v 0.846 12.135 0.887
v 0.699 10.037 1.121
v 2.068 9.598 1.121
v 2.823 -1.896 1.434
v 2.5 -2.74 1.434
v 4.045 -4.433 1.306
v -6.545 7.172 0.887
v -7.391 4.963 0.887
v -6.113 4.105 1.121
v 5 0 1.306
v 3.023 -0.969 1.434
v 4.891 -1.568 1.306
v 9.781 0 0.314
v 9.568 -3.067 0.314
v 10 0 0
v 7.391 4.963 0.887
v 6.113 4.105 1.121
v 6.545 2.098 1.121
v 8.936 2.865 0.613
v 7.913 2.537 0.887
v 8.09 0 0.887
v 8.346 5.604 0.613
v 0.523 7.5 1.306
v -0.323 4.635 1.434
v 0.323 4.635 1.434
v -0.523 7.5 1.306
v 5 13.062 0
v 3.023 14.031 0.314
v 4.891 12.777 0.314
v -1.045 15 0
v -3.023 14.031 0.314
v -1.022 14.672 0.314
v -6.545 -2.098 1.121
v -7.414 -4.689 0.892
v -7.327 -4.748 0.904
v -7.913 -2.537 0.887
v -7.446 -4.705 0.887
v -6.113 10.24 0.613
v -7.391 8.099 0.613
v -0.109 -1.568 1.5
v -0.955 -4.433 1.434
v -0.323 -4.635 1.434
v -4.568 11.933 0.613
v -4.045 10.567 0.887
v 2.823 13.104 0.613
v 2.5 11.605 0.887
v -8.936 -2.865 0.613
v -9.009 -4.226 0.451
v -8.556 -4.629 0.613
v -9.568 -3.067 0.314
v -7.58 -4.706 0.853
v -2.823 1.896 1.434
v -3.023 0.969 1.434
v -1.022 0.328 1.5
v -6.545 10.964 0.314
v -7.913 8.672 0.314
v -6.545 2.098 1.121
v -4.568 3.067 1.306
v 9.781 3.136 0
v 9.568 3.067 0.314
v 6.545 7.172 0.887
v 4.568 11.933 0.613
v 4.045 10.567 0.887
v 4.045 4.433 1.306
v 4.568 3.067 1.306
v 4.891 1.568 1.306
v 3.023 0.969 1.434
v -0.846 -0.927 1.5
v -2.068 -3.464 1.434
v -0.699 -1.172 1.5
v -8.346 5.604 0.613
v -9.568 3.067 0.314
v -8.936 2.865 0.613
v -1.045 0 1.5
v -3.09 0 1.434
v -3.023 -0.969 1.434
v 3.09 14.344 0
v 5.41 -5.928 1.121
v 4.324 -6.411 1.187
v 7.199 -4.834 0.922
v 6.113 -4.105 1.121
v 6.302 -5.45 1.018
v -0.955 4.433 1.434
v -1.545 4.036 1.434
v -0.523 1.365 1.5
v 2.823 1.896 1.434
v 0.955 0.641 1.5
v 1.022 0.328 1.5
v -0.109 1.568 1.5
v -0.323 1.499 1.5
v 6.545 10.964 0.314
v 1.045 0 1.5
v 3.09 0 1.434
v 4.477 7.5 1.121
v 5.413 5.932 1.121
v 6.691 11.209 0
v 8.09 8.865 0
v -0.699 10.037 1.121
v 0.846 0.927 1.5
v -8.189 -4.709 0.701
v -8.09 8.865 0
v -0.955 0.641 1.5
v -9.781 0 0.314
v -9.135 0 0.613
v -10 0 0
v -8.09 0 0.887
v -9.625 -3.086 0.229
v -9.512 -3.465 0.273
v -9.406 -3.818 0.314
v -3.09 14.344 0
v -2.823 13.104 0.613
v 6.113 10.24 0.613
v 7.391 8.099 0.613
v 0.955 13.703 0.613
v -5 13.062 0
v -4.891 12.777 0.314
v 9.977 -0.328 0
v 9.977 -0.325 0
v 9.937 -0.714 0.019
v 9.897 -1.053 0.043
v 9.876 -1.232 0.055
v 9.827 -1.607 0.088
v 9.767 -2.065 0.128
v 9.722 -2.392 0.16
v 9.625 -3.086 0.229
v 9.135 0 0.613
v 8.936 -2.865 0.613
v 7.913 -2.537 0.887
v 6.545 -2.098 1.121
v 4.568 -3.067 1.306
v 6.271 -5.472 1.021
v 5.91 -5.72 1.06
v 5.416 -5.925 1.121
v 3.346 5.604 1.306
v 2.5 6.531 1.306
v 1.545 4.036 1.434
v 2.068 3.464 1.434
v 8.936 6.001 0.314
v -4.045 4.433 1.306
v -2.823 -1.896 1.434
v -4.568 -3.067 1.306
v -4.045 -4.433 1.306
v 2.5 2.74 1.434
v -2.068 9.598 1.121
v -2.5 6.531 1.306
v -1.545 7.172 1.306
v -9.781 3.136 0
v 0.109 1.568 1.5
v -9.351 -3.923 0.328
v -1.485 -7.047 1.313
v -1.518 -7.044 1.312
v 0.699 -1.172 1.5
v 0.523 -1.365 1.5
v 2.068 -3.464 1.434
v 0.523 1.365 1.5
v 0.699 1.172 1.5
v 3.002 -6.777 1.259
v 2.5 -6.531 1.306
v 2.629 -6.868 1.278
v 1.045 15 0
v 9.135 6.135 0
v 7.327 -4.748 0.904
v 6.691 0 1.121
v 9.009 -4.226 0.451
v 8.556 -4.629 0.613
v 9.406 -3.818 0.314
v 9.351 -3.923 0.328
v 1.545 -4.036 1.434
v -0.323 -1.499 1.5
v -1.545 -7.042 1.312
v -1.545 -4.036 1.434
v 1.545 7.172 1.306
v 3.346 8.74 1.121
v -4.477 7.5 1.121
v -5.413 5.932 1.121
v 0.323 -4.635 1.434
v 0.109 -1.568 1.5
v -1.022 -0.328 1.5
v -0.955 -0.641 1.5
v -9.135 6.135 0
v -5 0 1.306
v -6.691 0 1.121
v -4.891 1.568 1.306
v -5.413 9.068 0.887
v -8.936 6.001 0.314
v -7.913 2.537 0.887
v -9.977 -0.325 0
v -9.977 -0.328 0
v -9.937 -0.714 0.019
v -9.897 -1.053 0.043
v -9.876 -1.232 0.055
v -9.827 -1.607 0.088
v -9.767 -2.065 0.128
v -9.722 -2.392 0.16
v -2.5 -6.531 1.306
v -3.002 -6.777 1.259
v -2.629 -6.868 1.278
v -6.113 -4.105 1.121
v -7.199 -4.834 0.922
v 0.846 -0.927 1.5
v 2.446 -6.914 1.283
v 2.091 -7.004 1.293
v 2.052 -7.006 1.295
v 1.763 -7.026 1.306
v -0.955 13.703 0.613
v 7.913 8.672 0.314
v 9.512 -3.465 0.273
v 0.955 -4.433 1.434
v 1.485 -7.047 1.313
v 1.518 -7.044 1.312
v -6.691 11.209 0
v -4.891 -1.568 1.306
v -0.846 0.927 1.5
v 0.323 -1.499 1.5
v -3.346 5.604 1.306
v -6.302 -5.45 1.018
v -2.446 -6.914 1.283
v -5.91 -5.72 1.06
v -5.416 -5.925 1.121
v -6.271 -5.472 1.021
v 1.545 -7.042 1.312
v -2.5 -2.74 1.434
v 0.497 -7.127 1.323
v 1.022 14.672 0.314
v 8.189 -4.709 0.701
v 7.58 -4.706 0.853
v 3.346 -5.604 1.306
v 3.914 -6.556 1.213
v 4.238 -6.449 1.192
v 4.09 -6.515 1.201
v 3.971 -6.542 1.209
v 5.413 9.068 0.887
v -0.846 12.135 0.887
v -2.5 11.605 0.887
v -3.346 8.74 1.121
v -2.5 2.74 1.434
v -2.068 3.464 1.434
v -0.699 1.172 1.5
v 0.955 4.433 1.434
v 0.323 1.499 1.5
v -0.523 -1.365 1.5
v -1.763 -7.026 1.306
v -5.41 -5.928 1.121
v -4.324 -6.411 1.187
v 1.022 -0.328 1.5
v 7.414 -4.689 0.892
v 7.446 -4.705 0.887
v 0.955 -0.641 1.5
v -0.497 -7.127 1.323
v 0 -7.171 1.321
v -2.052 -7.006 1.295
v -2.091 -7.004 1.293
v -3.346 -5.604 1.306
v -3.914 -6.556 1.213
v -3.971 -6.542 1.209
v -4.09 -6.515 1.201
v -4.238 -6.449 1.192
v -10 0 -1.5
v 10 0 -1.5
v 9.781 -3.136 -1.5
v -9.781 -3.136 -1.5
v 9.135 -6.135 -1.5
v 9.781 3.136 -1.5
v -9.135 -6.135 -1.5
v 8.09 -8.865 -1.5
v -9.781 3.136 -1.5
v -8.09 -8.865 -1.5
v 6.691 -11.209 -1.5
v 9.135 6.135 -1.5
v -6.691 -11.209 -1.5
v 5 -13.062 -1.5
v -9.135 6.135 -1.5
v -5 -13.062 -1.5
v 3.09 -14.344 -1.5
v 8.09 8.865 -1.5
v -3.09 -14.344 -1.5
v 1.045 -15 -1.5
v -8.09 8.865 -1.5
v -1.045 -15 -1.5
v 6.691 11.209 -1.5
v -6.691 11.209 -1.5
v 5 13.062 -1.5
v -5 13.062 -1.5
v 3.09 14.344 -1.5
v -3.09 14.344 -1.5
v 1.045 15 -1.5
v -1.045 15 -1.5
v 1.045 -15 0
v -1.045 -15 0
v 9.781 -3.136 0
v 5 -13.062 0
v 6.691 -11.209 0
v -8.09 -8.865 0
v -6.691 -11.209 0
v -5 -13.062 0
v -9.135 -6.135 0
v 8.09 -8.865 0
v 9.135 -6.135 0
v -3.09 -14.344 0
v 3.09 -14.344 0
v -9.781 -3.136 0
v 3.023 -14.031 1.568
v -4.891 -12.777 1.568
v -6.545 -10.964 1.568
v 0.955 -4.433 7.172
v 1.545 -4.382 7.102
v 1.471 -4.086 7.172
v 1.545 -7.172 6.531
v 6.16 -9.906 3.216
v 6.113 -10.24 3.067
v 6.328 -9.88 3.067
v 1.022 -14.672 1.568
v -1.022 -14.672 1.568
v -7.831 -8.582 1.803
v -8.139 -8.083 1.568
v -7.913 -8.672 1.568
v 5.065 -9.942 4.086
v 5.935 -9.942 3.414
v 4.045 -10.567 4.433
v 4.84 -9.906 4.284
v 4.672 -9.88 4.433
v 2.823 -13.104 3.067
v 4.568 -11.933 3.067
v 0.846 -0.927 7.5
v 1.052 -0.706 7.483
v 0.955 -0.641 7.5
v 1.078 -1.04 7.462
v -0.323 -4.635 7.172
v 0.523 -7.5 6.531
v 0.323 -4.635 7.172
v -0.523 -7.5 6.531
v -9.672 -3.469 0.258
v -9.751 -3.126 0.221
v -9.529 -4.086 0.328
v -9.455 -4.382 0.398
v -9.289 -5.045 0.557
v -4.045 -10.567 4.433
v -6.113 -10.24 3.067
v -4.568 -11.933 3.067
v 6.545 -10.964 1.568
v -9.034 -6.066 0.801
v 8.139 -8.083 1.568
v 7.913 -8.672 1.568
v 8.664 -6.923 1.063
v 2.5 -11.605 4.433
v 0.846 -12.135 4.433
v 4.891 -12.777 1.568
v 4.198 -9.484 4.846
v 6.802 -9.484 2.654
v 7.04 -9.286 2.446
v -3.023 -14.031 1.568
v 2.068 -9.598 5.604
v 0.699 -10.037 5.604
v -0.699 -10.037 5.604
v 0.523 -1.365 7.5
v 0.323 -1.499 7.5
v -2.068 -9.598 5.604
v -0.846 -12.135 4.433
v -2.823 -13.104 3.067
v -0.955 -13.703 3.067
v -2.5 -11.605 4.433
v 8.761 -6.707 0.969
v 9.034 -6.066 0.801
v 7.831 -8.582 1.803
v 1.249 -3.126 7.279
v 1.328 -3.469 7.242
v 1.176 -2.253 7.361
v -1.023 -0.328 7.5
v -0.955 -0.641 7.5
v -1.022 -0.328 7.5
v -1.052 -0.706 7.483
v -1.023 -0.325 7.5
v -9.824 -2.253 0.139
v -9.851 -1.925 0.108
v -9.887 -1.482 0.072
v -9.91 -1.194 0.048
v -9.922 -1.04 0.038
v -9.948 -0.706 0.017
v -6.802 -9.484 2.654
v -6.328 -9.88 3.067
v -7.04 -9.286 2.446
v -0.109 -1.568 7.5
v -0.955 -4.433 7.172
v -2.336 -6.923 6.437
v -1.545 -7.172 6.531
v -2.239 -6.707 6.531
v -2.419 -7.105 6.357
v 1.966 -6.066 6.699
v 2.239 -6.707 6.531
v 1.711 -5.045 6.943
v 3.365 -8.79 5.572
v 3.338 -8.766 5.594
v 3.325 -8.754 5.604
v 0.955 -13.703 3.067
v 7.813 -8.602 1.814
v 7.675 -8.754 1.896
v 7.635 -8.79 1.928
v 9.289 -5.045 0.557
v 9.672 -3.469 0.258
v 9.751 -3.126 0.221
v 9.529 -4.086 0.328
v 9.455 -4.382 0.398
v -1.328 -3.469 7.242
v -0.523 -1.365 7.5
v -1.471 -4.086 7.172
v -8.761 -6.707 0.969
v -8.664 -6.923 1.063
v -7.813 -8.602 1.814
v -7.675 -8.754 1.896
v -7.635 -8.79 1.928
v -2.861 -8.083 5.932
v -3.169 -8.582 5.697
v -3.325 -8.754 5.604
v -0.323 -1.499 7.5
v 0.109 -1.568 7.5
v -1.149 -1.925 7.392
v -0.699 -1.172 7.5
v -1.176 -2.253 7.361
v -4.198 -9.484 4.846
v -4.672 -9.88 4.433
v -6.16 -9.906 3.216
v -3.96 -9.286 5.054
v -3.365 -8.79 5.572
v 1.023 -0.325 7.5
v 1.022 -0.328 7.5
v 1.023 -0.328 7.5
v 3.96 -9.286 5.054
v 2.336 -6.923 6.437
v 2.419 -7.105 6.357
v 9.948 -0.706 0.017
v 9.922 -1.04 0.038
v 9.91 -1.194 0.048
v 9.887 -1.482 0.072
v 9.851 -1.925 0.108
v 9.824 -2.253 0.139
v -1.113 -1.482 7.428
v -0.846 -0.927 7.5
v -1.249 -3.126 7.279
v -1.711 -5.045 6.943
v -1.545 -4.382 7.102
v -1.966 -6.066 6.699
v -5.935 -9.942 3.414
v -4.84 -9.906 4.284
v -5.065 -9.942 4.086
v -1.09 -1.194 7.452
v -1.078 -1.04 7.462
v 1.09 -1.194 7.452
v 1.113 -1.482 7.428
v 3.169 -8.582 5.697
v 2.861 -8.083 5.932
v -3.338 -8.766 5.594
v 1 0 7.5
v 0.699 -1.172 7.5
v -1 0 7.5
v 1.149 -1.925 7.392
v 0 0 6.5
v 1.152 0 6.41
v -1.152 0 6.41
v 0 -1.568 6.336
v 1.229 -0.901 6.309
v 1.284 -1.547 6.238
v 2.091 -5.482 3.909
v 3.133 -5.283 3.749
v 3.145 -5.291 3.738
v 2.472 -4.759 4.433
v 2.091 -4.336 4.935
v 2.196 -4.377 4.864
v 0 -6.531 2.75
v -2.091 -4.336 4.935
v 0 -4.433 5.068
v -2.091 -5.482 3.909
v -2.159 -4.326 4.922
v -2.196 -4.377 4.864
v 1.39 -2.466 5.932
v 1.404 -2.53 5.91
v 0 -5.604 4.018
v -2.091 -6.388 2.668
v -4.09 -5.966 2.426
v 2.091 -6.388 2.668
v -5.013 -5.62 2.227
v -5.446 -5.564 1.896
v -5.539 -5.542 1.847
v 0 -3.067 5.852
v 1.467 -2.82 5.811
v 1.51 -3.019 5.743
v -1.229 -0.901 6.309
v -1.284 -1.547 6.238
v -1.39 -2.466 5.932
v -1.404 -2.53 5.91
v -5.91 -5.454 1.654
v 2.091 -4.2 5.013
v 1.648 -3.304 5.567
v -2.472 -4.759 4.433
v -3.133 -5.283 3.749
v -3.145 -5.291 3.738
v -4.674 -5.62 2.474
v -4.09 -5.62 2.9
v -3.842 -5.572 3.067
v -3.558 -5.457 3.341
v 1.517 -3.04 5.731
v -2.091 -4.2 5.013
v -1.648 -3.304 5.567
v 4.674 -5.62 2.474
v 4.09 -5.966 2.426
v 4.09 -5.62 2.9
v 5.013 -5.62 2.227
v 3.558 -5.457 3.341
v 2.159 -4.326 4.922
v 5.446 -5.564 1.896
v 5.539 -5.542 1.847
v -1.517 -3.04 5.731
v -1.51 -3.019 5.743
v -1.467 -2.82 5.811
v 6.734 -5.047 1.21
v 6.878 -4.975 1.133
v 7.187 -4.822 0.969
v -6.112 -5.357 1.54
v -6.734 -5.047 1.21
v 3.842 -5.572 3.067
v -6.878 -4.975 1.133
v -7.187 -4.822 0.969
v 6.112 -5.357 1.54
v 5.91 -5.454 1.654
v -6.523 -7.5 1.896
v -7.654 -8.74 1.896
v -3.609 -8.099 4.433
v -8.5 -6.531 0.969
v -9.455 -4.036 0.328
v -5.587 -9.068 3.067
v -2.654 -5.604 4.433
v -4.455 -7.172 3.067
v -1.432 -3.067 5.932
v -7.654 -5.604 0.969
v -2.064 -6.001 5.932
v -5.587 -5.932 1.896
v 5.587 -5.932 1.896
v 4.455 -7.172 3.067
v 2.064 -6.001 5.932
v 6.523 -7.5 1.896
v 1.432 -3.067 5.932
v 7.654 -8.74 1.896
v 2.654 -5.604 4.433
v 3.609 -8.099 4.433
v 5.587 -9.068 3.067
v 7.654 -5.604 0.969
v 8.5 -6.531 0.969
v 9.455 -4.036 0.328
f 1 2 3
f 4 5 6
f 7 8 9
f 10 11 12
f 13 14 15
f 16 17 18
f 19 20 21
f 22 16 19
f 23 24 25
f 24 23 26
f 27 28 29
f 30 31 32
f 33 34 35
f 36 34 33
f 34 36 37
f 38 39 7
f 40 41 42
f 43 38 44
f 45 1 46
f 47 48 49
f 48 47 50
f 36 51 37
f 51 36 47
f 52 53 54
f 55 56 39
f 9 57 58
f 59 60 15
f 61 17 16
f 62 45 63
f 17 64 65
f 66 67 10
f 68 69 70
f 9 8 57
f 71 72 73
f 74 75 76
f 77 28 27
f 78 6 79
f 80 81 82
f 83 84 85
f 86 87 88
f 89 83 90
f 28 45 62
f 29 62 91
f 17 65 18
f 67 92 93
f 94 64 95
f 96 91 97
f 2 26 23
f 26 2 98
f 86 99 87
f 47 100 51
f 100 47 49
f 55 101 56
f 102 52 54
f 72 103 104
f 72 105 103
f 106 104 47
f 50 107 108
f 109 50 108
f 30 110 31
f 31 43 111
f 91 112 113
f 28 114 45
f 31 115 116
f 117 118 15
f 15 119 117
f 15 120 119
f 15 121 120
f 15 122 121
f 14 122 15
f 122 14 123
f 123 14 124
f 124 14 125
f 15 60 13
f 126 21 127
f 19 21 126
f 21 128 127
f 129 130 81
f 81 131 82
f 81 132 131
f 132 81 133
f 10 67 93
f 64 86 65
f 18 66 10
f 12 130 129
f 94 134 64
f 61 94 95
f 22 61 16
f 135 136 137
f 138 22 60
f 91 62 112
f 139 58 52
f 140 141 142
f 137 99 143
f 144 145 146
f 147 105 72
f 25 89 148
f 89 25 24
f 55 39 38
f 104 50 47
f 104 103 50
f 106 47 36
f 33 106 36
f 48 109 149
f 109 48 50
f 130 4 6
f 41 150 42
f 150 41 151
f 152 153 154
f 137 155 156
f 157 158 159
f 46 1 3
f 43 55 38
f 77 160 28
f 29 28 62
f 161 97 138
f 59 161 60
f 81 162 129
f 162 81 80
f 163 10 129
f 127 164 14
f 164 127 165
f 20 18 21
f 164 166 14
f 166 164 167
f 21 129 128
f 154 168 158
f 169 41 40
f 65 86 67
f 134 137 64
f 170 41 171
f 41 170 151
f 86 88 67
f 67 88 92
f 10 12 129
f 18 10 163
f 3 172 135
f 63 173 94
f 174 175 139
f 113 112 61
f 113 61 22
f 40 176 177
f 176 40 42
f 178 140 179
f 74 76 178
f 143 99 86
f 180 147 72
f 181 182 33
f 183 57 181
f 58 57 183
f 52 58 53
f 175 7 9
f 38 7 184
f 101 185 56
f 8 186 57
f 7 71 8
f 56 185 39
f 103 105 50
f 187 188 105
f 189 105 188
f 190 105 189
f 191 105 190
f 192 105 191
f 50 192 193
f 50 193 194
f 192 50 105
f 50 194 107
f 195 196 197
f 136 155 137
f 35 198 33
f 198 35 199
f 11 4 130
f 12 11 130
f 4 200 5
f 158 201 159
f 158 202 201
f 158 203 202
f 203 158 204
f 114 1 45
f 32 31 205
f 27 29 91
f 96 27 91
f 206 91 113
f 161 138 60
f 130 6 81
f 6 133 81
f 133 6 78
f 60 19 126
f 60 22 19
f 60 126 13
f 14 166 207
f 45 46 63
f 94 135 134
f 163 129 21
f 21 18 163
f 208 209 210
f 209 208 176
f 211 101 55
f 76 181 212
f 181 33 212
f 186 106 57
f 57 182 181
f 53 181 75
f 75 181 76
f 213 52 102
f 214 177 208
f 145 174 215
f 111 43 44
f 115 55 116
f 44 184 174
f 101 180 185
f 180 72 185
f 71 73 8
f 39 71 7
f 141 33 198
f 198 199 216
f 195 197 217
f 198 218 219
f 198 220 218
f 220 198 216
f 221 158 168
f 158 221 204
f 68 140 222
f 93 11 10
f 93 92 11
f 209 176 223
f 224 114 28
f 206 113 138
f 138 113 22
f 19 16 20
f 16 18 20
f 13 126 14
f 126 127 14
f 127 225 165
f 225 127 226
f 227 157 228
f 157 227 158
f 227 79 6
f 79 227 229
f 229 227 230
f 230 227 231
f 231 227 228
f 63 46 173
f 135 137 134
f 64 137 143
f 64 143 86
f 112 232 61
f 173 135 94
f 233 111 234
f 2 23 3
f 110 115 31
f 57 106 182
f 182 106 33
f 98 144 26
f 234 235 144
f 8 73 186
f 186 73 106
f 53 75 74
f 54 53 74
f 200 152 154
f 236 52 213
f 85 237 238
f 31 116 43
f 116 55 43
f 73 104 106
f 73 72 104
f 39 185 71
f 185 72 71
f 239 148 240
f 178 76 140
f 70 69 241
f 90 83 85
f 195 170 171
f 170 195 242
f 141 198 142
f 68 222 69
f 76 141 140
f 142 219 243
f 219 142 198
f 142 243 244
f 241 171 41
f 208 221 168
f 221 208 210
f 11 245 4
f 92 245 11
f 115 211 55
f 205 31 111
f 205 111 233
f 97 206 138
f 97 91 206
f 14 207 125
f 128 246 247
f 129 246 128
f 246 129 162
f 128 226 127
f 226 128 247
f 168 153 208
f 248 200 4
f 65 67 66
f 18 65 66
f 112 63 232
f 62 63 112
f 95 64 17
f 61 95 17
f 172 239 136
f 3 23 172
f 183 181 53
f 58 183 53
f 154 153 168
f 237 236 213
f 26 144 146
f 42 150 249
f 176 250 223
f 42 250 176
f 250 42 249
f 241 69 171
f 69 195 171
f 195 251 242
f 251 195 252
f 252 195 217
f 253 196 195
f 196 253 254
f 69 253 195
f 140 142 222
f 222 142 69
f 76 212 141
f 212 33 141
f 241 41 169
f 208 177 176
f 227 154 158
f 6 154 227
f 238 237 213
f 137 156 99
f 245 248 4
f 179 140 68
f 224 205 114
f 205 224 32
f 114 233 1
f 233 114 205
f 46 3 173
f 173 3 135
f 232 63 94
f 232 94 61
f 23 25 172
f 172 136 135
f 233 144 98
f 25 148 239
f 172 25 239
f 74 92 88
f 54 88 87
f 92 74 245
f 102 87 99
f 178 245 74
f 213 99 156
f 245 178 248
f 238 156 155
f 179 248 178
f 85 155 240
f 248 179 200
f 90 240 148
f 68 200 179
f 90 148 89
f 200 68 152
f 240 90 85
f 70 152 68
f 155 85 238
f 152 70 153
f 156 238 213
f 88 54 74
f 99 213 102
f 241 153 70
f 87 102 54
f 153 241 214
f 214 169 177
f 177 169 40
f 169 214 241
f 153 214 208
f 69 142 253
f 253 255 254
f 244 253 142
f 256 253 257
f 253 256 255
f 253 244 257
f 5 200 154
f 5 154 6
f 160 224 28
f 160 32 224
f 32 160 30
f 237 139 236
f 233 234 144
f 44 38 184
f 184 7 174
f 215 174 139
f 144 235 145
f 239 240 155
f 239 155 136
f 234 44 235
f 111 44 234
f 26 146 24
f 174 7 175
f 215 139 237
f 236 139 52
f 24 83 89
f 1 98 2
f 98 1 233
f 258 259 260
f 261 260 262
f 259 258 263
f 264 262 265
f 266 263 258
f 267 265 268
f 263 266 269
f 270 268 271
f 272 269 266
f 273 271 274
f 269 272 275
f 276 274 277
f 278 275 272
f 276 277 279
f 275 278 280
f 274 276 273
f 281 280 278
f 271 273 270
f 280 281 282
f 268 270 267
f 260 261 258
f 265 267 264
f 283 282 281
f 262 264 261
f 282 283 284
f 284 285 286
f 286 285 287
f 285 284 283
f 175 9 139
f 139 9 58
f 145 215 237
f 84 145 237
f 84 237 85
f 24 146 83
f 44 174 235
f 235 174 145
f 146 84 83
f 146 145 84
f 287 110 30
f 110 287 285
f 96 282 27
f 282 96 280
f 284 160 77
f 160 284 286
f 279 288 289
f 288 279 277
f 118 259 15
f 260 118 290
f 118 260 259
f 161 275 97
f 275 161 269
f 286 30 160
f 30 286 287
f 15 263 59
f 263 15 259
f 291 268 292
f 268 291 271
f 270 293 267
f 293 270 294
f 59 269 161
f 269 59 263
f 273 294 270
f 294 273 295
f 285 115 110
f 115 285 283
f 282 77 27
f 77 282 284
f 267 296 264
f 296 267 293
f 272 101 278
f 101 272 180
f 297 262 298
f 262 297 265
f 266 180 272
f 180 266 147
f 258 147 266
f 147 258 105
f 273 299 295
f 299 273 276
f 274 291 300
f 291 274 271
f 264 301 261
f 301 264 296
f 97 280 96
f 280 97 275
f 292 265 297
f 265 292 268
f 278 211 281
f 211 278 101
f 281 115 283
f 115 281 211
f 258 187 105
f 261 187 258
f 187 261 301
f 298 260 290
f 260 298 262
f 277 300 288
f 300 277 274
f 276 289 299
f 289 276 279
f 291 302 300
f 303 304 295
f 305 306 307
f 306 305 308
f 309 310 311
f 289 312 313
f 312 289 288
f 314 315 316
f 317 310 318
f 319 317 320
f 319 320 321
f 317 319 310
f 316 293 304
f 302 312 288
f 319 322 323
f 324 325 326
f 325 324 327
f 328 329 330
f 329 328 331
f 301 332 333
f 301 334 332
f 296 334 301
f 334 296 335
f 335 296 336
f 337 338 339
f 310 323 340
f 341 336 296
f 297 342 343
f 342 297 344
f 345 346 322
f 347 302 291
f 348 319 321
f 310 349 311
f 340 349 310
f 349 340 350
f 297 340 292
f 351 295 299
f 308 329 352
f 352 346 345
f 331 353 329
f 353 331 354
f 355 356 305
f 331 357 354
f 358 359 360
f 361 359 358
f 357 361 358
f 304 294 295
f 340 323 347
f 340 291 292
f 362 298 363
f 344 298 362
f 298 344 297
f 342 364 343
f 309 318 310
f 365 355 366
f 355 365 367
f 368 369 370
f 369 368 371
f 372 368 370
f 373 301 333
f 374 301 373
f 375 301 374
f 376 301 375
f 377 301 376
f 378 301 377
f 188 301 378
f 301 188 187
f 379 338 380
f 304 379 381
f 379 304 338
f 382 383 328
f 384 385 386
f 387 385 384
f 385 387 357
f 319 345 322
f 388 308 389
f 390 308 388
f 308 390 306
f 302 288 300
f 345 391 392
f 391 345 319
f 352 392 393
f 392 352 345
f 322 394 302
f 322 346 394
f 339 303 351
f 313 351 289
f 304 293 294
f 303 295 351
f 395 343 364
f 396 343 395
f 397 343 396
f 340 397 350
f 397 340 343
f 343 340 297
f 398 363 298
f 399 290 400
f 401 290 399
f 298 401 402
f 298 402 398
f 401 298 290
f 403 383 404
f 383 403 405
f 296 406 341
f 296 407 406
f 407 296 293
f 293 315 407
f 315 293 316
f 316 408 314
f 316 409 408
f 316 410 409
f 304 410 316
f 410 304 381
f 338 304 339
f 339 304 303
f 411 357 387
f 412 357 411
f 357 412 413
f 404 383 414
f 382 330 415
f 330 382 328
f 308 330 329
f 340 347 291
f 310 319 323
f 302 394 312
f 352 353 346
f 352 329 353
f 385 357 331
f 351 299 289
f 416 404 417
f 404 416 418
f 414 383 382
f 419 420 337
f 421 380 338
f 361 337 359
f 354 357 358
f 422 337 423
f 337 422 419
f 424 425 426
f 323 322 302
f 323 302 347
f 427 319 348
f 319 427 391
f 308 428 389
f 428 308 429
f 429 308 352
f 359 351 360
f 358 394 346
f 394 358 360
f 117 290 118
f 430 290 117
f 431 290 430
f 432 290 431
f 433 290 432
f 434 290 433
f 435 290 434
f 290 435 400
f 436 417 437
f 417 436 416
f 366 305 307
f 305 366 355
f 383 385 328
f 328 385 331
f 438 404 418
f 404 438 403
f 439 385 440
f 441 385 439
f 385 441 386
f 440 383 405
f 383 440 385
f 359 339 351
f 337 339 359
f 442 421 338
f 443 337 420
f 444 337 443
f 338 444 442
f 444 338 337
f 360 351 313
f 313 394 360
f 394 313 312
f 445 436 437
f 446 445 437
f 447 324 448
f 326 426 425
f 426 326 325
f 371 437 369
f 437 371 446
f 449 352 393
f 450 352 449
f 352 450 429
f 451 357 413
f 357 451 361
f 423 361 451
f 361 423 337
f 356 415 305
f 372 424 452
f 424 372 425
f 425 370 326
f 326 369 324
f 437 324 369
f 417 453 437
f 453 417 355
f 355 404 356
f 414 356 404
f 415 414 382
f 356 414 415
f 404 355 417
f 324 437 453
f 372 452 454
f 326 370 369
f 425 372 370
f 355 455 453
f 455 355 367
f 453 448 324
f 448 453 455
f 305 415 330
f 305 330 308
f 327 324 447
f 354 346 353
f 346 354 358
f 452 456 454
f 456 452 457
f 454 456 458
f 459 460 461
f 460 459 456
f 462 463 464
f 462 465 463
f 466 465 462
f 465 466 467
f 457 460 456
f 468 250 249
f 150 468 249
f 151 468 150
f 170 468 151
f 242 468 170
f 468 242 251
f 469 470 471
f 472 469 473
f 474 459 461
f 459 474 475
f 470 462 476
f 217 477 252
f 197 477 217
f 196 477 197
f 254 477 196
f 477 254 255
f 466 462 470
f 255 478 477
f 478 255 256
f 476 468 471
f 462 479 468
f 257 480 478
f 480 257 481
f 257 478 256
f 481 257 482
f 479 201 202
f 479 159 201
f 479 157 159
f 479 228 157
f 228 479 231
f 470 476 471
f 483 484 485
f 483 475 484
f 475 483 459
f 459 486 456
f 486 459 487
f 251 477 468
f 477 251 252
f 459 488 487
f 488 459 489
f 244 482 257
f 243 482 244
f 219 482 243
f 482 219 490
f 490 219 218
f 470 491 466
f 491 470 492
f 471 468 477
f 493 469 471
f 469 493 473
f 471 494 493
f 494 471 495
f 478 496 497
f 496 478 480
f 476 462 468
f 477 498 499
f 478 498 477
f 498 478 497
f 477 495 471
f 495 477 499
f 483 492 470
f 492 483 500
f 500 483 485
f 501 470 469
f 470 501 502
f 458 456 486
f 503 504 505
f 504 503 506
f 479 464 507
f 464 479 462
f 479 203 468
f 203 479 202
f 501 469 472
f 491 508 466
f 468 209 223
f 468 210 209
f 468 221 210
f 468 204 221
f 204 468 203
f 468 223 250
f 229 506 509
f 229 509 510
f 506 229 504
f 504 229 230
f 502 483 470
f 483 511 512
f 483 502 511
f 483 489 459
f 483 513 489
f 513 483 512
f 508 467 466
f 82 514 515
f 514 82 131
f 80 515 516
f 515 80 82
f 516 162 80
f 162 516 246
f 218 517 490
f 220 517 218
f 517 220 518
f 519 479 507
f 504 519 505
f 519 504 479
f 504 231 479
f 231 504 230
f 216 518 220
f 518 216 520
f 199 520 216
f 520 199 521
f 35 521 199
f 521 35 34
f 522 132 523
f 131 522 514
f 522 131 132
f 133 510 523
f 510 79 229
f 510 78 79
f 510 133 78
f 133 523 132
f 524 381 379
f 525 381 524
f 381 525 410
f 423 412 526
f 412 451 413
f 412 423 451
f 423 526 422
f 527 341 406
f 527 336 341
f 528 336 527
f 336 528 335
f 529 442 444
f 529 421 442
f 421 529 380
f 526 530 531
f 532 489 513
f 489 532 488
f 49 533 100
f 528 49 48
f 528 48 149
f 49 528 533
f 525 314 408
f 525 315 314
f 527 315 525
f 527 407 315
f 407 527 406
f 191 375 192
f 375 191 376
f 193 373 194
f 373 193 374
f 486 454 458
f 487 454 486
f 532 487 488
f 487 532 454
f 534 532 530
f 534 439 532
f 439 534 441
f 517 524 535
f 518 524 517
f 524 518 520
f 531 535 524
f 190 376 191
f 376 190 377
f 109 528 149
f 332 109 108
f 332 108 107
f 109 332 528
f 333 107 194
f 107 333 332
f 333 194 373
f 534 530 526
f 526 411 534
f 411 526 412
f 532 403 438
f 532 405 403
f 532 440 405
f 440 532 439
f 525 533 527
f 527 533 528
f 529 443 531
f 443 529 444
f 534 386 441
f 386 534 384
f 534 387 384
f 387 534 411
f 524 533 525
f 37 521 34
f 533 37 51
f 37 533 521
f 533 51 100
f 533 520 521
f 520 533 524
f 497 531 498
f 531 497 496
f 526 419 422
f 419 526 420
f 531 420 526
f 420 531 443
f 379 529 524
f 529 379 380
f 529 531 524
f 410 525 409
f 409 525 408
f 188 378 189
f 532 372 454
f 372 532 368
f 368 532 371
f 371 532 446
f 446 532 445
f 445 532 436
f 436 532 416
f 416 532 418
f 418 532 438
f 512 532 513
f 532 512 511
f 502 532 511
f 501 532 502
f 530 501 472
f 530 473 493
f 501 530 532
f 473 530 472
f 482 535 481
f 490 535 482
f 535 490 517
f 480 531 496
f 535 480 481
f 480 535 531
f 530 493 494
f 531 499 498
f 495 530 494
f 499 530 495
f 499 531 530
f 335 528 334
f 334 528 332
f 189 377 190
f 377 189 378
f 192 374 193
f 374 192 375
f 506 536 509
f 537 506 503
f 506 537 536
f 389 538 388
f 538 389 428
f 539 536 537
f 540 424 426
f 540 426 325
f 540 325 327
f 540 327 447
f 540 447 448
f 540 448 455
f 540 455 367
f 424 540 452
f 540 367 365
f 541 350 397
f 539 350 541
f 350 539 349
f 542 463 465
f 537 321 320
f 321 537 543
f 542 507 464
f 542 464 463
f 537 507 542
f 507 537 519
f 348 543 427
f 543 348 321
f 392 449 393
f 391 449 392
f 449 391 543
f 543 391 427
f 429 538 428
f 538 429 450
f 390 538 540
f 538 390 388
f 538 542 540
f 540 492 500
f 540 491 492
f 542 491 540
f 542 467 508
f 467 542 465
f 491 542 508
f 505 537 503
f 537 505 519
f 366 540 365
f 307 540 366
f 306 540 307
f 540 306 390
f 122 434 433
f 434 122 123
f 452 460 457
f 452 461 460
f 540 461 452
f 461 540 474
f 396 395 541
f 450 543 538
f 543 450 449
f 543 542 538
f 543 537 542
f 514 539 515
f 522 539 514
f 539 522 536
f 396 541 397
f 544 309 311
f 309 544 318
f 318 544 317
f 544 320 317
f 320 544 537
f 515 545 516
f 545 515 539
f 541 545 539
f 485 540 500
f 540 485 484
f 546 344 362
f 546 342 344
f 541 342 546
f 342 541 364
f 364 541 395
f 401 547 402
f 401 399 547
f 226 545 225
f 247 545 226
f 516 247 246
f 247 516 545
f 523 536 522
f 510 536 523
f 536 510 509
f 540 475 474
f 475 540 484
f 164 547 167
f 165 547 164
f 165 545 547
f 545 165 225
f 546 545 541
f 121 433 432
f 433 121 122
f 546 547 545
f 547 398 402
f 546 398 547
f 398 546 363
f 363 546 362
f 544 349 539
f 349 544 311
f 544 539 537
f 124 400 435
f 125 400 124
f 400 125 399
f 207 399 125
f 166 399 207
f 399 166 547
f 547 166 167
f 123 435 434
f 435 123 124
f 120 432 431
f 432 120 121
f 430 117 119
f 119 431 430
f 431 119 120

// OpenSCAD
hook_distance=15;
base_thickness=3;
base_height=30;
base_width=20;
fixing_hole=0;//[0:OFF,1:ON]
Sfn=30;

module Base()
{
resize([base_width,base_height,3])sphere(r=10,center=true,$fn=Sfn);
translate([0,0,-base_thickness/4])
{
resize([base_width,base_height,0])cylinder(base_thickness/2,r=10,center=true,$fn=Sfn);
}
}

module Hook()
{
difference() {
resize([base_width,base_height,hook_distance])sphere(r=10,center=true,$fn=Sfn);
translate([0,0,-hook_distance/2])
{
cube([base_width+1,base_height+1,hook_distance],center=true);
}
translate([0,base_height/2,hook_distance/2])
{
cube([base_width+1,base_height,hook_distance],center=true);
}


translate([0,0,-1])
{
rotate ([0,90,0]) 
resize([hook_distance,base_height/2,base_width])sphere (hook_distance,base_width, center = true, $fn=Sfn);
}


translate([-base_width/2-1,0,hook_distance/2])
{
resize([base_width,base_height,hook_distance])sphere(r=10,center=true,$fn=Sfn);
}
translate([base_width/2+1,0,hook_distance/2])
{
resize([base_width,base_height,hook_distance])sphere(r=10,center=true,$fn=Sfn);
}

}
}

module Hole()
{
if(fixing_hole > 0)
{
translate([0,base_height/5,1.5])
{

cylinder(base_thickness*2,d=fixing_hole,center=true,$fn=Sfn);
cylinder(h = fixing_hole, d1 = fixing_hole, d2 = fixing_hole*2, center = true,$fn=Sfn);

}
}
}

difference()
{
Base();
Hole();
}
Hook();
